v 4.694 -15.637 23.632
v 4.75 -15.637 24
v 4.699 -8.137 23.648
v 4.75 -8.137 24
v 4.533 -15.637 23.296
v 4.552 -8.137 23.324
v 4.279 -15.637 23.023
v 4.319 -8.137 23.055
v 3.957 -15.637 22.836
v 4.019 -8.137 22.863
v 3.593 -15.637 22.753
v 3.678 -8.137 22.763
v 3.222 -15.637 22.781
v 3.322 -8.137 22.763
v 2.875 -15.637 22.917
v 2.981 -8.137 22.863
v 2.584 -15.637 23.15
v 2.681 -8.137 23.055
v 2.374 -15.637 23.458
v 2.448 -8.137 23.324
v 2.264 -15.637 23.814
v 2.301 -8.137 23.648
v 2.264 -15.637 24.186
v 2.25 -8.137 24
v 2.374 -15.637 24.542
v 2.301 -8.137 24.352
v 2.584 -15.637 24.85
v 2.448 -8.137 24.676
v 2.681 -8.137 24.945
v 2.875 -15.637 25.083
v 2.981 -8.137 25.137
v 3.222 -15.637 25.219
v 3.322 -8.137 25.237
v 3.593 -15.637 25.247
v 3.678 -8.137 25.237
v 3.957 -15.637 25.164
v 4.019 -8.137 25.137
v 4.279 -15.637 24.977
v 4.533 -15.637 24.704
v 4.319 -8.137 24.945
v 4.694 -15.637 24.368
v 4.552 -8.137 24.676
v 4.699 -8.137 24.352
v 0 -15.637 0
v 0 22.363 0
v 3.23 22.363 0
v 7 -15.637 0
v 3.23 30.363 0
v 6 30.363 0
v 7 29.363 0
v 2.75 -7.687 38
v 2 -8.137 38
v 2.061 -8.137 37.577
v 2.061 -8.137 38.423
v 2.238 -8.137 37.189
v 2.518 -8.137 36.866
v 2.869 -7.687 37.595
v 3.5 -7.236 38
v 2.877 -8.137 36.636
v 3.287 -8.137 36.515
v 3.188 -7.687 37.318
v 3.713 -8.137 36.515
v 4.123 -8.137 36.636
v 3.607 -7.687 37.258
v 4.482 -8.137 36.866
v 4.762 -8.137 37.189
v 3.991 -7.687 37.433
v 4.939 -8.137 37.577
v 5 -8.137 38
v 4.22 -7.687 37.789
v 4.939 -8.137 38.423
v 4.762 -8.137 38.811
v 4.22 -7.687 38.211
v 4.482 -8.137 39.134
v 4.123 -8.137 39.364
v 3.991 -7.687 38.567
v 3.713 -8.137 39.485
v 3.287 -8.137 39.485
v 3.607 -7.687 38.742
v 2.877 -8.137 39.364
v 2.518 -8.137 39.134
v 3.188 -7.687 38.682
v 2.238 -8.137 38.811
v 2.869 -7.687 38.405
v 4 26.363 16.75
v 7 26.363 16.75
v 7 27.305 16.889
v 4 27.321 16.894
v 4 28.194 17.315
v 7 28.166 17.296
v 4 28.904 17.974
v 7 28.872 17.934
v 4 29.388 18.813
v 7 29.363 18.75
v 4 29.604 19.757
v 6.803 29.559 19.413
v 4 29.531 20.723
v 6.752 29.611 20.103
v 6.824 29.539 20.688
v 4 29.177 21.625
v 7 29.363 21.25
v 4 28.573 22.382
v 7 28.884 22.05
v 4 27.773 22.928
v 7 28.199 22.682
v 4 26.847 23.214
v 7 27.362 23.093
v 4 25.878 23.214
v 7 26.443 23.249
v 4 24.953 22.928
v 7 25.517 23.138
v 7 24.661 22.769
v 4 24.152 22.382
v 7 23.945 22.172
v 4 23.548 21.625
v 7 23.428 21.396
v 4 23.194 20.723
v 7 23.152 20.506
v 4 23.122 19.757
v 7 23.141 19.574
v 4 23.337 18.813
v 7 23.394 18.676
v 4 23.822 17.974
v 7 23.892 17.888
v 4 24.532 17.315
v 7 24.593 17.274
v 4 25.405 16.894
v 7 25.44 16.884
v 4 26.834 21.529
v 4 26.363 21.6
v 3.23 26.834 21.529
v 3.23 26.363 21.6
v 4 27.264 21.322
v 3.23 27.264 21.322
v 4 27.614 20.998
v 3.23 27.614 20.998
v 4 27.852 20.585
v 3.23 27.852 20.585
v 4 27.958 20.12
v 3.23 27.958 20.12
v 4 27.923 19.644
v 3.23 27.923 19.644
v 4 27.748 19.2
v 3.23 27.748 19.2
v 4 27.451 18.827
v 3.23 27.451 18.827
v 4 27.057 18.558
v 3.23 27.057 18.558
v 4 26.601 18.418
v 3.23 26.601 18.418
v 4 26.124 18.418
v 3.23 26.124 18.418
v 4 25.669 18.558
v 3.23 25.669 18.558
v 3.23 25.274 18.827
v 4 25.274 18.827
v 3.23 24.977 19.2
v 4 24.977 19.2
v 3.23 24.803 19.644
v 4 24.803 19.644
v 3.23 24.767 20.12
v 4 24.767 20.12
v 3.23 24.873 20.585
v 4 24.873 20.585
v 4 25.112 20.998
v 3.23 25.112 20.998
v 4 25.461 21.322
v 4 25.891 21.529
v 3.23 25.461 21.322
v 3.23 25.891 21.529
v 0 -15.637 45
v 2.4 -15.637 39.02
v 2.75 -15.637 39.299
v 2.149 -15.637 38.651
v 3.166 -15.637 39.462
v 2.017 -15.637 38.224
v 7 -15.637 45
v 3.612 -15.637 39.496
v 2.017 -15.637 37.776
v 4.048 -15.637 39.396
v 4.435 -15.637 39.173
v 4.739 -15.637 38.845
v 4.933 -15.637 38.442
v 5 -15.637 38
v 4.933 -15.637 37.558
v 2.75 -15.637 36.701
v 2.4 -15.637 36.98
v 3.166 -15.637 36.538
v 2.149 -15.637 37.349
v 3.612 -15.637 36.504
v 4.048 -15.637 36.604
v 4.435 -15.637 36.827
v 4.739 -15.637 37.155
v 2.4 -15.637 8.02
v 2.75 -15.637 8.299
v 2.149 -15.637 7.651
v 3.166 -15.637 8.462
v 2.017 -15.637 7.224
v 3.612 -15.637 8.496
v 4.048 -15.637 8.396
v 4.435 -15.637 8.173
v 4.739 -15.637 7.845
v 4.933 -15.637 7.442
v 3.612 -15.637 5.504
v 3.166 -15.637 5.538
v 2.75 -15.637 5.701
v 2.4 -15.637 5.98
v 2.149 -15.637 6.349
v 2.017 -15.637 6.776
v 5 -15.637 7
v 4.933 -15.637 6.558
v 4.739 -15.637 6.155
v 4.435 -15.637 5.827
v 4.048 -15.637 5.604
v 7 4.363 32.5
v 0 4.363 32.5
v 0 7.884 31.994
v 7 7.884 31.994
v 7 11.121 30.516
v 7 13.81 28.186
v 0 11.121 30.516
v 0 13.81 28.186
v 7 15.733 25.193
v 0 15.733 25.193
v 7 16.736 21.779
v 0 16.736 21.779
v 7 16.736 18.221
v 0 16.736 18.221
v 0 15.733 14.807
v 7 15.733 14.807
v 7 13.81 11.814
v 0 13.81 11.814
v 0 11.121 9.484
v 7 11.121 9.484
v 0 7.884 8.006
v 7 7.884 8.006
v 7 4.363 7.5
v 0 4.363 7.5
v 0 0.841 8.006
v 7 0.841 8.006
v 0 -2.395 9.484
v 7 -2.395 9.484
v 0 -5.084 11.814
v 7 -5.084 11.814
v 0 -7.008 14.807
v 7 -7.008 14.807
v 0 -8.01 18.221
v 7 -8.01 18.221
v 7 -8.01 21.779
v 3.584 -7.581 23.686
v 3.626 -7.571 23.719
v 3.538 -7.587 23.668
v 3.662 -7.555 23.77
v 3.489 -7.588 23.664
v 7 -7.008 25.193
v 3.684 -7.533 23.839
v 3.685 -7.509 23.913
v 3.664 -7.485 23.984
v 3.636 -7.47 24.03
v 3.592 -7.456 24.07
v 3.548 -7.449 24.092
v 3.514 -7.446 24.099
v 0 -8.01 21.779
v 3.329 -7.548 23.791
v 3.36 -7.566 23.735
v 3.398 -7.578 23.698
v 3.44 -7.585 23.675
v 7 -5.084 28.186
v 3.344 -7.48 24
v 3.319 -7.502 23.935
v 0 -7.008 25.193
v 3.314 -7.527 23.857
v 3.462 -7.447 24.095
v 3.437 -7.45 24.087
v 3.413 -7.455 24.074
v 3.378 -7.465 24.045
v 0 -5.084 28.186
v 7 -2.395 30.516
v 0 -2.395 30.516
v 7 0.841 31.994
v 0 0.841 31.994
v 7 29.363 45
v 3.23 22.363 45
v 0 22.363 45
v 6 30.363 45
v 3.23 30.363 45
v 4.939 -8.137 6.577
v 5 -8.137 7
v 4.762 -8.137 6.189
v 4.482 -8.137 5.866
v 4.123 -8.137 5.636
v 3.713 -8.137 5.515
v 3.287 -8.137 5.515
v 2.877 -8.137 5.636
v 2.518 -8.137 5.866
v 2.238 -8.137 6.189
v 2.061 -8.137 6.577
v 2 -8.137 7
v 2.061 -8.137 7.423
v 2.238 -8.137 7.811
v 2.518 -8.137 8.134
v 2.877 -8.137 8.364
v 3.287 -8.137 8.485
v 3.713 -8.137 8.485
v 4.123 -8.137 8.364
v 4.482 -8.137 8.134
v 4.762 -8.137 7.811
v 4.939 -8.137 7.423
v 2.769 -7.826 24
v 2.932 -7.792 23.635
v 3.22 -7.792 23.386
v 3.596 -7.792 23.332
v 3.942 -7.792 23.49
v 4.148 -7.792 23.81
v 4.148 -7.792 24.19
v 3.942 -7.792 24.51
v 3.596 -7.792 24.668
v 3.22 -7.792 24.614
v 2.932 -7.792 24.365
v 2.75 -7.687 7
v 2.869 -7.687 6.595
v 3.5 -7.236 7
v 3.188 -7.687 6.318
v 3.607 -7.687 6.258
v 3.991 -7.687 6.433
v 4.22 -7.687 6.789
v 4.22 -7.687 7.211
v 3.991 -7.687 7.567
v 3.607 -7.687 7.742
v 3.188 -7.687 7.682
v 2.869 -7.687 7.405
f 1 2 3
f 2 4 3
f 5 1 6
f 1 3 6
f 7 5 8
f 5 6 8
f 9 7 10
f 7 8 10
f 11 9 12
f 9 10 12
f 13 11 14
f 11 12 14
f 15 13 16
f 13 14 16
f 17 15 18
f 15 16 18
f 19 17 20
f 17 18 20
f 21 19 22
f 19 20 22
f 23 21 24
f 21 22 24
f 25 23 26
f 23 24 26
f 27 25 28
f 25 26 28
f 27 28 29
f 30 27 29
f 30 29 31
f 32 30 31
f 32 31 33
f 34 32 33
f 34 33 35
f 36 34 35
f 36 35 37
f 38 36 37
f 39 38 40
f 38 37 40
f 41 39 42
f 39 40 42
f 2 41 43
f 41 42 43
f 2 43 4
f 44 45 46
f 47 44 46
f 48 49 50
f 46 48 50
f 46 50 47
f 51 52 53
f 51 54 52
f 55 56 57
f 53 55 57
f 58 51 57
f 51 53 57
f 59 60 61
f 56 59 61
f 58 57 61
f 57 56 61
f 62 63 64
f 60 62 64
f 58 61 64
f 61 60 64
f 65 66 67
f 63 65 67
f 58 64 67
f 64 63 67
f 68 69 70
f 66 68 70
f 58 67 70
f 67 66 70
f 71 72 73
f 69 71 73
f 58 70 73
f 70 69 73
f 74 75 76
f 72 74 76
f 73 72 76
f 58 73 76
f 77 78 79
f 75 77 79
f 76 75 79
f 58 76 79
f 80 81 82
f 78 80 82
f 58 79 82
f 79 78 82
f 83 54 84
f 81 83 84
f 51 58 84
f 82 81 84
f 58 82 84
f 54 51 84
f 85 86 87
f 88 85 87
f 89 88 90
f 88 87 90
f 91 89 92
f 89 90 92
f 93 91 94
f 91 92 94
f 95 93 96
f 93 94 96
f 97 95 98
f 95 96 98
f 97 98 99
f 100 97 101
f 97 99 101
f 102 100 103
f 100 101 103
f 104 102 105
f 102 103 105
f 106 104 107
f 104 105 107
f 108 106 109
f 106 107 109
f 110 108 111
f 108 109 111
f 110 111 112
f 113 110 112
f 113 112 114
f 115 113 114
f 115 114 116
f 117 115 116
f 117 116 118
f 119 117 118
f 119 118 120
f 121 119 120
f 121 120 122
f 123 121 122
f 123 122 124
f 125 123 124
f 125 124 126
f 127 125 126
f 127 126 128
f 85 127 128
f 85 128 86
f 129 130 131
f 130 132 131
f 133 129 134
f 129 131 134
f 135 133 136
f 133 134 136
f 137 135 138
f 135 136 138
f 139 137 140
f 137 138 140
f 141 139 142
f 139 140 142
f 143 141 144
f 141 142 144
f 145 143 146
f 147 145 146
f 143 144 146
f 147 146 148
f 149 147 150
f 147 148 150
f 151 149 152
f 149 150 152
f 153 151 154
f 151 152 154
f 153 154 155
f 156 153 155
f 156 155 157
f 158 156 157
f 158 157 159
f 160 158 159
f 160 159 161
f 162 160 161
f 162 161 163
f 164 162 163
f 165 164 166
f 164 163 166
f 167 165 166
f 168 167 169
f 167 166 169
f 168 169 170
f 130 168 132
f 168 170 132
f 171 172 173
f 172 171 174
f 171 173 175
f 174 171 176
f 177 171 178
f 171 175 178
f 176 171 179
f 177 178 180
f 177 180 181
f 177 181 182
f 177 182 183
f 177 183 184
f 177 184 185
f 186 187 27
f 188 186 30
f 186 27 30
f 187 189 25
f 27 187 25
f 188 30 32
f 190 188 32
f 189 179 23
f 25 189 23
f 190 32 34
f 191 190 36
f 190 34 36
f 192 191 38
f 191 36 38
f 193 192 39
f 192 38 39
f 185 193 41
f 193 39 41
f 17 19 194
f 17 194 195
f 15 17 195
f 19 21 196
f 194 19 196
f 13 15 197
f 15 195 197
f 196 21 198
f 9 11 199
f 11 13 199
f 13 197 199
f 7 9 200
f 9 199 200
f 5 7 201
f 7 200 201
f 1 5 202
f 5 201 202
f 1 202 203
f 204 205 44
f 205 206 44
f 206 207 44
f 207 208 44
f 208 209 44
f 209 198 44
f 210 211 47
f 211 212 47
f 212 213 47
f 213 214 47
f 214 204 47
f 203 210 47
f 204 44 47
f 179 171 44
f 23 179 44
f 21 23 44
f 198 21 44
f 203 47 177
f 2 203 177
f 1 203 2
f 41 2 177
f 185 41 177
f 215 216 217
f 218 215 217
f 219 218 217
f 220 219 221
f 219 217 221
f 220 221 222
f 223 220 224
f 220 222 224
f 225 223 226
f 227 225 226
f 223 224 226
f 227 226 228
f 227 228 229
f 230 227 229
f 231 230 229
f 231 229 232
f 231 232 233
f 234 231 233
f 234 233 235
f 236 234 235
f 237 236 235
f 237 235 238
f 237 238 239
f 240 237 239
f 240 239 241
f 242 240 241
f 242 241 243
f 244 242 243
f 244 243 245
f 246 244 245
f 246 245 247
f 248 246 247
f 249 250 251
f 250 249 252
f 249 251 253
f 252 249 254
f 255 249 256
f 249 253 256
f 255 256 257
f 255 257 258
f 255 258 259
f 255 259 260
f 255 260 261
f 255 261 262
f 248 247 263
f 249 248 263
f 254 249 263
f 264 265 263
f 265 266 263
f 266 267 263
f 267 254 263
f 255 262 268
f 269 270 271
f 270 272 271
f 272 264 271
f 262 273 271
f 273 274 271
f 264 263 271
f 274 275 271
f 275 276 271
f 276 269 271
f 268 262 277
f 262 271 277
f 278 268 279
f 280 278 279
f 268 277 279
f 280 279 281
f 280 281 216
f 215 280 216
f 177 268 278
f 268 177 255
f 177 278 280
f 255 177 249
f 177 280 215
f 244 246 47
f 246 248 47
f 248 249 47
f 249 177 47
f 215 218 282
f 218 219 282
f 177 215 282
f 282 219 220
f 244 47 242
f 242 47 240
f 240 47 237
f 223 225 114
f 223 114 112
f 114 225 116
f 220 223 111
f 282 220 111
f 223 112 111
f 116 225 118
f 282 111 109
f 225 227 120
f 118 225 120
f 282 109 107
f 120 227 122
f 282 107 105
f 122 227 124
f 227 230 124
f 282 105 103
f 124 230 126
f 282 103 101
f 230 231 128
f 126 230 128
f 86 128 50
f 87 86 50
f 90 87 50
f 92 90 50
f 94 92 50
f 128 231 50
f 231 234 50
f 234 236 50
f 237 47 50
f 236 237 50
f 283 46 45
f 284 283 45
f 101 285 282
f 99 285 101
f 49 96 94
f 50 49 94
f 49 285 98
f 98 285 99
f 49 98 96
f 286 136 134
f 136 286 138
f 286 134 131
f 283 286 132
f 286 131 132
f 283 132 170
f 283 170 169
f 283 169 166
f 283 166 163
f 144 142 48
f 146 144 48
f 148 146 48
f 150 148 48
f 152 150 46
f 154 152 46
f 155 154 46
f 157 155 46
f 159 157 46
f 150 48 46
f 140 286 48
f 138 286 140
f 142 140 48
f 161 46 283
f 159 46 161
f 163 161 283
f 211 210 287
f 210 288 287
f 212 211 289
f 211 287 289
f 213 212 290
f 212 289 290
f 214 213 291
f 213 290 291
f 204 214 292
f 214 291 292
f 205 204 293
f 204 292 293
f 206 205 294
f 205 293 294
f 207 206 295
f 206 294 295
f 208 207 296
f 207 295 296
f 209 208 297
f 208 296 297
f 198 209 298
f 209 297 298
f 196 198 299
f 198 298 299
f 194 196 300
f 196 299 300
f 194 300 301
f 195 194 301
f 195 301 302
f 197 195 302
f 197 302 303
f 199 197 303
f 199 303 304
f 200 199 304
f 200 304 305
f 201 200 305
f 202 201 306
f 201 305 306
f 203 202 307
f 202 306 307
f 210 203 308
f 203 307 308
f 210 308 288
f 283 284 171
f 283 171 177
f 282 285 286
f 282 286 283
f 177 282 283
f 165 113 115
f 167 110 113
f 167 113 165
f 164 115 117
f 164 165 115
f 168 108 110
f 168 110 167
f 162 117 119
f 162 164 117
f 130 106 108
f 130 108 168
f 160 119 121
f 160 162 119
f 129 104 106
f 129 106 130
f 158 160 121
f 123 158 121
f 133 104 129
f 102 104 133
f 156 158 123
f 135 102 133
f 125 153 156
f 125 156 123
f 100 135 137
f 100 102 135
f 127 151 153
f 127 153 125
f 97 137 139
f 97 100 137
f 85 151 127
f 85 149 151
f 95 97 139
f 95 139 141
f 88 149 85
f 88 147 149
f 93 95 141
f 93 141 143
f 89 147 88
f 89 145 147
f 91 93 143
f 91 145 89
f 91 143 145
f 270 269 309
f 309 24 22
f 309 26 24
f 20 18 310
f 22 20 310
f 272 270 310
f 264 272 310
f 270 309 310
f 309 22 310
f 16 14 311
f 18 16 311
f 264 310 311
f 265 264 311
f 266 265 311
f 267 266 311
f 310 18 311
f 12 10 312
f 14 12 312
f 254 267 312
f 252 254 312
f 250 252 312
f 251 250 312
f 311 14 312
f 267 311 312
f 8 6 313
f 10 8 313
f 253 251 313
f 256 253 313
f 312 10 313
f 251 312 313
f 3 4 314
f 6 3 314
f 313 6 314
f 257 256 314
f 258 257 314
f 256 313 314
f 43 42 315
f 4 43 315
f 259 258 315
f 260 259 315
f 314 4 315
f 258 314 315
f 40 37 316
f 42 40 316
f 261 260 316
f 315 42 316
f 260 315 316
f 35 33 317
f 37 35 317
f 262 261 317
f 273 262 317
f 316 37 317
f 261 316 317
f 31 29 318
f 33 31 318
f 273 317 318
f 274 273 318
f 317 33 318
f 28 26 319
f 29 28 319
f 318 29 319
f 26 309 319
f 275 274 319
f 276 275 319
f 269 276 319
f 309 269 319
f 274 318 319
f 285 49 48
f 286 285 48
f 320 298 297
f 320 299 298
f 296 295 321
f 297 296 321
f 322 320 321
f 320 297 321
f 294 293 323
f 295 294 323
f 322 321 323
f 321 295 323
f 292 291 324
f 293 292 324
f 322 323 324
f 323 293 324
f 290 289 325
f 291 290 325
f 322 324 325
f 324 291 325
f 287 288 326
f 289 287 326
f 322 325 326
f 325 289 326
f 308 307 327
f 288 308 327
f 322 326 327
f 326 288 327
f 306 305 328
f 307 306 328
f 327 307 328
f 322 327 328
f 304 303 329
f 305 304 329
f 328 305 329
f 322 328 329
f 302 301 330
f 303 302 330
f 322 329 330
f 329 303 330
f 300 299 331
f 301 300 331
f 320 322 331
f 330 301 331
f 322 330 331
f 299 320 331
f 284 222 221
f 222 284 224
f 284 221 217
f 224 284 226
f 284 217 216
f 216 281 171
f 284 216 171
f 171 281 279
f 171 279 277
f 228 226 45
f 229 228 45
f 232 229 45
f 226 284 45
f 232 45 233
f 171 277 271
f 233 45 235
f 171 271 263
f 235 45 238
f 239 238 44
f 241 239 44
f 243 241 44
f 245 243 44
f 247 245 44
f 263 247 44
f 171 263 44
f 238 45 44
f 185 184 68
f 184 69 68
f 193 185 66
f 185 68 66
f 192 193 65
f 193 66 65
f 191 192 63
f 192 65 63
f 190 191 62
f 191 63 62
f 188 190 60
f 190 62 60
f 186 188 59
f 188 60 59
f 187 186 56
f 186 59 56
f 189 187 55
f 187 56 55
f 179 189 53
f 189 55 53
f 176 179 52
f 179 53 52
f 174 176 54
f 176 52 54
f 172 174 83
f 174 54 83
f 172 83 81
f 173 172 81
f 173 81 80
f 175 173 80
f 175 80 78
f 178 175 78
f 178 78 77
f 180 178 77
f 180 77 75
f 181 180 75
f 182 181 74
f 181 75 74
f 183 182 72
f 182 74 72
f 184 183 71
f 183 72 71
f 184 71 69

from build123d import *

# Parameters (mm, degrees)
BOSS_EXTRUDE1_DEPTH            = 45
CBORE_FOR_M3_SHCS1_D           = 3.2
CBORE_FOR_M3_SHCS1_CBORE_D     = 6.5
CBORE_FOR_M3_SHCS1_CBORE_DEPTH = 3
F_25_0_25_DIAMETER_HOLE1_D     = 25
CHAMFER1_SIZE                  = 1
M3X0_5_TAPPED_HOLE1_D          = 2.5
M3X0_5_TAPPED_HOLE1_DEPTH      = 7.5
M3X0_5_TAPPED_HOLE1_TIP        = 0.751075774
F_3_0MM_DOWEL_HOLE1_D          = 3
F_3_0MM_DOWEL_HOLE1_DEPTH      = 7.5
F_3_0MM_DOWEL_HOLE1_TIP        = 0.901290929


with BuildPart() as part:
    # Sketch1 → Boss-Extrude1 (new body)
    with BuildSketch(Plane.XY):
        Polygon((3.23, 30.362745098), (3.23, 22.362745098), (0, 22.362745098), (0, -15.637254902), (7, -15.637254902), (7, 30.362745098), align=None)
    extrude(amount=BOSS_EXTRUDE1_DEPTH)

    # CBORE for M3 SHCS1 (through all)
    with Locations(Plane(origin=(7, 0, 0), x_dir=(0, 0, -1), z_dir=(1, 0, 0))):
        with Locations((-20, 26.362745098)):
            CounterBoreHole(CBORE_FOR_M3_SHCS1_D / 2, CBORE_FOR_M3_SHCS1_CBORE_D / 2, CBORE_FOR_M3_SHCS1_CBORE_DEPTH)

    # Ø25.0 (25) Diameter Hole1 (through all)
    with Locations(Plane(origin=(7, 0, 0), x_dir=(0, 0, -1), z_dir=(1, 0, 0))):
        with Locations((-20, 4.362745098)):
            Hole(F_25_0_25_DIAMETER_HOLE1_D / 2)

    # Chamfer1
    # the kernel refuses this chamfer: 1 mm, written as the material it takes off along each edge
    with BuildSketch(Plane(origin=(7, 30.362745098, -2.571682988), x_dir=(-0.9996219169112968, 0.027495876610585623, 0), z_dir=(0, 0, 1))) as chamfer1_piece_1:
        Polygon((CHAMFER1_SIZE * 0.999621916911, CHAMFER1_SIZE * 0.0274958766106), (-CHAMFER1_SIZE * 0.0274958766106, CHAMFER1_SIZE * 0.999621916911), (0, 0), align=None)
    extrude(amount=50.143365976, mode=Mode.SUBTRACT)

    # M3x0.5 Tapped Hole1
    with Locations(Plane(origin=(0, -15.637254902, 0), x_dir=(-1, 0, 0), z_dir=(0, -1, 0))):
        with Locations((-3.5, -24)):
            Hole(M3X0_5_TAPPED_HOLE1_D / 2, depth=M3X0_5_TAPPED_HOLE1_DEPTH)
            with Locations((0, 0, -(M3X0_5_TAPPED_HOLE1_DEPTH + M3X0_5_TAPPED_HOLE1_TIP / 2))):  # 118° drill point
                Cone(0, M3X0_5_TAPPED_HOLE1_D / 2, M3X0_5_TAPPED_HOLE1_TIP, mode=Mode.SUBTRACT)

    # Ø3.0mm Dowel Hole1
    with Locations(Plane(origin=(0, -15.637254902, 0), x_dir=(-1, 0, 0), z_dir=(0, -1, 0))):
        with Locations((-3.5, -38), (-3.5, -7)):
            Hole(F_3_0MM_DOWEL_HOLE1_D / 2, depth=F_3_0MM_DOWEL_HOLE1_DEPTH)
            with Locations((0, 0, -(F_3_0MM_DOWEL_HOLE1_DEPTH + F_3_0MM_DOWEL_HOLE1_TIP / 2))):  # 118° drill point
                Cone(0, F_3_0MM_DOWEL_HOLE1_D / 2, F_3_0MM_DOWEL_HOLE1_TIP, mode=Mode.SUBTRACT)


solid = part.part
